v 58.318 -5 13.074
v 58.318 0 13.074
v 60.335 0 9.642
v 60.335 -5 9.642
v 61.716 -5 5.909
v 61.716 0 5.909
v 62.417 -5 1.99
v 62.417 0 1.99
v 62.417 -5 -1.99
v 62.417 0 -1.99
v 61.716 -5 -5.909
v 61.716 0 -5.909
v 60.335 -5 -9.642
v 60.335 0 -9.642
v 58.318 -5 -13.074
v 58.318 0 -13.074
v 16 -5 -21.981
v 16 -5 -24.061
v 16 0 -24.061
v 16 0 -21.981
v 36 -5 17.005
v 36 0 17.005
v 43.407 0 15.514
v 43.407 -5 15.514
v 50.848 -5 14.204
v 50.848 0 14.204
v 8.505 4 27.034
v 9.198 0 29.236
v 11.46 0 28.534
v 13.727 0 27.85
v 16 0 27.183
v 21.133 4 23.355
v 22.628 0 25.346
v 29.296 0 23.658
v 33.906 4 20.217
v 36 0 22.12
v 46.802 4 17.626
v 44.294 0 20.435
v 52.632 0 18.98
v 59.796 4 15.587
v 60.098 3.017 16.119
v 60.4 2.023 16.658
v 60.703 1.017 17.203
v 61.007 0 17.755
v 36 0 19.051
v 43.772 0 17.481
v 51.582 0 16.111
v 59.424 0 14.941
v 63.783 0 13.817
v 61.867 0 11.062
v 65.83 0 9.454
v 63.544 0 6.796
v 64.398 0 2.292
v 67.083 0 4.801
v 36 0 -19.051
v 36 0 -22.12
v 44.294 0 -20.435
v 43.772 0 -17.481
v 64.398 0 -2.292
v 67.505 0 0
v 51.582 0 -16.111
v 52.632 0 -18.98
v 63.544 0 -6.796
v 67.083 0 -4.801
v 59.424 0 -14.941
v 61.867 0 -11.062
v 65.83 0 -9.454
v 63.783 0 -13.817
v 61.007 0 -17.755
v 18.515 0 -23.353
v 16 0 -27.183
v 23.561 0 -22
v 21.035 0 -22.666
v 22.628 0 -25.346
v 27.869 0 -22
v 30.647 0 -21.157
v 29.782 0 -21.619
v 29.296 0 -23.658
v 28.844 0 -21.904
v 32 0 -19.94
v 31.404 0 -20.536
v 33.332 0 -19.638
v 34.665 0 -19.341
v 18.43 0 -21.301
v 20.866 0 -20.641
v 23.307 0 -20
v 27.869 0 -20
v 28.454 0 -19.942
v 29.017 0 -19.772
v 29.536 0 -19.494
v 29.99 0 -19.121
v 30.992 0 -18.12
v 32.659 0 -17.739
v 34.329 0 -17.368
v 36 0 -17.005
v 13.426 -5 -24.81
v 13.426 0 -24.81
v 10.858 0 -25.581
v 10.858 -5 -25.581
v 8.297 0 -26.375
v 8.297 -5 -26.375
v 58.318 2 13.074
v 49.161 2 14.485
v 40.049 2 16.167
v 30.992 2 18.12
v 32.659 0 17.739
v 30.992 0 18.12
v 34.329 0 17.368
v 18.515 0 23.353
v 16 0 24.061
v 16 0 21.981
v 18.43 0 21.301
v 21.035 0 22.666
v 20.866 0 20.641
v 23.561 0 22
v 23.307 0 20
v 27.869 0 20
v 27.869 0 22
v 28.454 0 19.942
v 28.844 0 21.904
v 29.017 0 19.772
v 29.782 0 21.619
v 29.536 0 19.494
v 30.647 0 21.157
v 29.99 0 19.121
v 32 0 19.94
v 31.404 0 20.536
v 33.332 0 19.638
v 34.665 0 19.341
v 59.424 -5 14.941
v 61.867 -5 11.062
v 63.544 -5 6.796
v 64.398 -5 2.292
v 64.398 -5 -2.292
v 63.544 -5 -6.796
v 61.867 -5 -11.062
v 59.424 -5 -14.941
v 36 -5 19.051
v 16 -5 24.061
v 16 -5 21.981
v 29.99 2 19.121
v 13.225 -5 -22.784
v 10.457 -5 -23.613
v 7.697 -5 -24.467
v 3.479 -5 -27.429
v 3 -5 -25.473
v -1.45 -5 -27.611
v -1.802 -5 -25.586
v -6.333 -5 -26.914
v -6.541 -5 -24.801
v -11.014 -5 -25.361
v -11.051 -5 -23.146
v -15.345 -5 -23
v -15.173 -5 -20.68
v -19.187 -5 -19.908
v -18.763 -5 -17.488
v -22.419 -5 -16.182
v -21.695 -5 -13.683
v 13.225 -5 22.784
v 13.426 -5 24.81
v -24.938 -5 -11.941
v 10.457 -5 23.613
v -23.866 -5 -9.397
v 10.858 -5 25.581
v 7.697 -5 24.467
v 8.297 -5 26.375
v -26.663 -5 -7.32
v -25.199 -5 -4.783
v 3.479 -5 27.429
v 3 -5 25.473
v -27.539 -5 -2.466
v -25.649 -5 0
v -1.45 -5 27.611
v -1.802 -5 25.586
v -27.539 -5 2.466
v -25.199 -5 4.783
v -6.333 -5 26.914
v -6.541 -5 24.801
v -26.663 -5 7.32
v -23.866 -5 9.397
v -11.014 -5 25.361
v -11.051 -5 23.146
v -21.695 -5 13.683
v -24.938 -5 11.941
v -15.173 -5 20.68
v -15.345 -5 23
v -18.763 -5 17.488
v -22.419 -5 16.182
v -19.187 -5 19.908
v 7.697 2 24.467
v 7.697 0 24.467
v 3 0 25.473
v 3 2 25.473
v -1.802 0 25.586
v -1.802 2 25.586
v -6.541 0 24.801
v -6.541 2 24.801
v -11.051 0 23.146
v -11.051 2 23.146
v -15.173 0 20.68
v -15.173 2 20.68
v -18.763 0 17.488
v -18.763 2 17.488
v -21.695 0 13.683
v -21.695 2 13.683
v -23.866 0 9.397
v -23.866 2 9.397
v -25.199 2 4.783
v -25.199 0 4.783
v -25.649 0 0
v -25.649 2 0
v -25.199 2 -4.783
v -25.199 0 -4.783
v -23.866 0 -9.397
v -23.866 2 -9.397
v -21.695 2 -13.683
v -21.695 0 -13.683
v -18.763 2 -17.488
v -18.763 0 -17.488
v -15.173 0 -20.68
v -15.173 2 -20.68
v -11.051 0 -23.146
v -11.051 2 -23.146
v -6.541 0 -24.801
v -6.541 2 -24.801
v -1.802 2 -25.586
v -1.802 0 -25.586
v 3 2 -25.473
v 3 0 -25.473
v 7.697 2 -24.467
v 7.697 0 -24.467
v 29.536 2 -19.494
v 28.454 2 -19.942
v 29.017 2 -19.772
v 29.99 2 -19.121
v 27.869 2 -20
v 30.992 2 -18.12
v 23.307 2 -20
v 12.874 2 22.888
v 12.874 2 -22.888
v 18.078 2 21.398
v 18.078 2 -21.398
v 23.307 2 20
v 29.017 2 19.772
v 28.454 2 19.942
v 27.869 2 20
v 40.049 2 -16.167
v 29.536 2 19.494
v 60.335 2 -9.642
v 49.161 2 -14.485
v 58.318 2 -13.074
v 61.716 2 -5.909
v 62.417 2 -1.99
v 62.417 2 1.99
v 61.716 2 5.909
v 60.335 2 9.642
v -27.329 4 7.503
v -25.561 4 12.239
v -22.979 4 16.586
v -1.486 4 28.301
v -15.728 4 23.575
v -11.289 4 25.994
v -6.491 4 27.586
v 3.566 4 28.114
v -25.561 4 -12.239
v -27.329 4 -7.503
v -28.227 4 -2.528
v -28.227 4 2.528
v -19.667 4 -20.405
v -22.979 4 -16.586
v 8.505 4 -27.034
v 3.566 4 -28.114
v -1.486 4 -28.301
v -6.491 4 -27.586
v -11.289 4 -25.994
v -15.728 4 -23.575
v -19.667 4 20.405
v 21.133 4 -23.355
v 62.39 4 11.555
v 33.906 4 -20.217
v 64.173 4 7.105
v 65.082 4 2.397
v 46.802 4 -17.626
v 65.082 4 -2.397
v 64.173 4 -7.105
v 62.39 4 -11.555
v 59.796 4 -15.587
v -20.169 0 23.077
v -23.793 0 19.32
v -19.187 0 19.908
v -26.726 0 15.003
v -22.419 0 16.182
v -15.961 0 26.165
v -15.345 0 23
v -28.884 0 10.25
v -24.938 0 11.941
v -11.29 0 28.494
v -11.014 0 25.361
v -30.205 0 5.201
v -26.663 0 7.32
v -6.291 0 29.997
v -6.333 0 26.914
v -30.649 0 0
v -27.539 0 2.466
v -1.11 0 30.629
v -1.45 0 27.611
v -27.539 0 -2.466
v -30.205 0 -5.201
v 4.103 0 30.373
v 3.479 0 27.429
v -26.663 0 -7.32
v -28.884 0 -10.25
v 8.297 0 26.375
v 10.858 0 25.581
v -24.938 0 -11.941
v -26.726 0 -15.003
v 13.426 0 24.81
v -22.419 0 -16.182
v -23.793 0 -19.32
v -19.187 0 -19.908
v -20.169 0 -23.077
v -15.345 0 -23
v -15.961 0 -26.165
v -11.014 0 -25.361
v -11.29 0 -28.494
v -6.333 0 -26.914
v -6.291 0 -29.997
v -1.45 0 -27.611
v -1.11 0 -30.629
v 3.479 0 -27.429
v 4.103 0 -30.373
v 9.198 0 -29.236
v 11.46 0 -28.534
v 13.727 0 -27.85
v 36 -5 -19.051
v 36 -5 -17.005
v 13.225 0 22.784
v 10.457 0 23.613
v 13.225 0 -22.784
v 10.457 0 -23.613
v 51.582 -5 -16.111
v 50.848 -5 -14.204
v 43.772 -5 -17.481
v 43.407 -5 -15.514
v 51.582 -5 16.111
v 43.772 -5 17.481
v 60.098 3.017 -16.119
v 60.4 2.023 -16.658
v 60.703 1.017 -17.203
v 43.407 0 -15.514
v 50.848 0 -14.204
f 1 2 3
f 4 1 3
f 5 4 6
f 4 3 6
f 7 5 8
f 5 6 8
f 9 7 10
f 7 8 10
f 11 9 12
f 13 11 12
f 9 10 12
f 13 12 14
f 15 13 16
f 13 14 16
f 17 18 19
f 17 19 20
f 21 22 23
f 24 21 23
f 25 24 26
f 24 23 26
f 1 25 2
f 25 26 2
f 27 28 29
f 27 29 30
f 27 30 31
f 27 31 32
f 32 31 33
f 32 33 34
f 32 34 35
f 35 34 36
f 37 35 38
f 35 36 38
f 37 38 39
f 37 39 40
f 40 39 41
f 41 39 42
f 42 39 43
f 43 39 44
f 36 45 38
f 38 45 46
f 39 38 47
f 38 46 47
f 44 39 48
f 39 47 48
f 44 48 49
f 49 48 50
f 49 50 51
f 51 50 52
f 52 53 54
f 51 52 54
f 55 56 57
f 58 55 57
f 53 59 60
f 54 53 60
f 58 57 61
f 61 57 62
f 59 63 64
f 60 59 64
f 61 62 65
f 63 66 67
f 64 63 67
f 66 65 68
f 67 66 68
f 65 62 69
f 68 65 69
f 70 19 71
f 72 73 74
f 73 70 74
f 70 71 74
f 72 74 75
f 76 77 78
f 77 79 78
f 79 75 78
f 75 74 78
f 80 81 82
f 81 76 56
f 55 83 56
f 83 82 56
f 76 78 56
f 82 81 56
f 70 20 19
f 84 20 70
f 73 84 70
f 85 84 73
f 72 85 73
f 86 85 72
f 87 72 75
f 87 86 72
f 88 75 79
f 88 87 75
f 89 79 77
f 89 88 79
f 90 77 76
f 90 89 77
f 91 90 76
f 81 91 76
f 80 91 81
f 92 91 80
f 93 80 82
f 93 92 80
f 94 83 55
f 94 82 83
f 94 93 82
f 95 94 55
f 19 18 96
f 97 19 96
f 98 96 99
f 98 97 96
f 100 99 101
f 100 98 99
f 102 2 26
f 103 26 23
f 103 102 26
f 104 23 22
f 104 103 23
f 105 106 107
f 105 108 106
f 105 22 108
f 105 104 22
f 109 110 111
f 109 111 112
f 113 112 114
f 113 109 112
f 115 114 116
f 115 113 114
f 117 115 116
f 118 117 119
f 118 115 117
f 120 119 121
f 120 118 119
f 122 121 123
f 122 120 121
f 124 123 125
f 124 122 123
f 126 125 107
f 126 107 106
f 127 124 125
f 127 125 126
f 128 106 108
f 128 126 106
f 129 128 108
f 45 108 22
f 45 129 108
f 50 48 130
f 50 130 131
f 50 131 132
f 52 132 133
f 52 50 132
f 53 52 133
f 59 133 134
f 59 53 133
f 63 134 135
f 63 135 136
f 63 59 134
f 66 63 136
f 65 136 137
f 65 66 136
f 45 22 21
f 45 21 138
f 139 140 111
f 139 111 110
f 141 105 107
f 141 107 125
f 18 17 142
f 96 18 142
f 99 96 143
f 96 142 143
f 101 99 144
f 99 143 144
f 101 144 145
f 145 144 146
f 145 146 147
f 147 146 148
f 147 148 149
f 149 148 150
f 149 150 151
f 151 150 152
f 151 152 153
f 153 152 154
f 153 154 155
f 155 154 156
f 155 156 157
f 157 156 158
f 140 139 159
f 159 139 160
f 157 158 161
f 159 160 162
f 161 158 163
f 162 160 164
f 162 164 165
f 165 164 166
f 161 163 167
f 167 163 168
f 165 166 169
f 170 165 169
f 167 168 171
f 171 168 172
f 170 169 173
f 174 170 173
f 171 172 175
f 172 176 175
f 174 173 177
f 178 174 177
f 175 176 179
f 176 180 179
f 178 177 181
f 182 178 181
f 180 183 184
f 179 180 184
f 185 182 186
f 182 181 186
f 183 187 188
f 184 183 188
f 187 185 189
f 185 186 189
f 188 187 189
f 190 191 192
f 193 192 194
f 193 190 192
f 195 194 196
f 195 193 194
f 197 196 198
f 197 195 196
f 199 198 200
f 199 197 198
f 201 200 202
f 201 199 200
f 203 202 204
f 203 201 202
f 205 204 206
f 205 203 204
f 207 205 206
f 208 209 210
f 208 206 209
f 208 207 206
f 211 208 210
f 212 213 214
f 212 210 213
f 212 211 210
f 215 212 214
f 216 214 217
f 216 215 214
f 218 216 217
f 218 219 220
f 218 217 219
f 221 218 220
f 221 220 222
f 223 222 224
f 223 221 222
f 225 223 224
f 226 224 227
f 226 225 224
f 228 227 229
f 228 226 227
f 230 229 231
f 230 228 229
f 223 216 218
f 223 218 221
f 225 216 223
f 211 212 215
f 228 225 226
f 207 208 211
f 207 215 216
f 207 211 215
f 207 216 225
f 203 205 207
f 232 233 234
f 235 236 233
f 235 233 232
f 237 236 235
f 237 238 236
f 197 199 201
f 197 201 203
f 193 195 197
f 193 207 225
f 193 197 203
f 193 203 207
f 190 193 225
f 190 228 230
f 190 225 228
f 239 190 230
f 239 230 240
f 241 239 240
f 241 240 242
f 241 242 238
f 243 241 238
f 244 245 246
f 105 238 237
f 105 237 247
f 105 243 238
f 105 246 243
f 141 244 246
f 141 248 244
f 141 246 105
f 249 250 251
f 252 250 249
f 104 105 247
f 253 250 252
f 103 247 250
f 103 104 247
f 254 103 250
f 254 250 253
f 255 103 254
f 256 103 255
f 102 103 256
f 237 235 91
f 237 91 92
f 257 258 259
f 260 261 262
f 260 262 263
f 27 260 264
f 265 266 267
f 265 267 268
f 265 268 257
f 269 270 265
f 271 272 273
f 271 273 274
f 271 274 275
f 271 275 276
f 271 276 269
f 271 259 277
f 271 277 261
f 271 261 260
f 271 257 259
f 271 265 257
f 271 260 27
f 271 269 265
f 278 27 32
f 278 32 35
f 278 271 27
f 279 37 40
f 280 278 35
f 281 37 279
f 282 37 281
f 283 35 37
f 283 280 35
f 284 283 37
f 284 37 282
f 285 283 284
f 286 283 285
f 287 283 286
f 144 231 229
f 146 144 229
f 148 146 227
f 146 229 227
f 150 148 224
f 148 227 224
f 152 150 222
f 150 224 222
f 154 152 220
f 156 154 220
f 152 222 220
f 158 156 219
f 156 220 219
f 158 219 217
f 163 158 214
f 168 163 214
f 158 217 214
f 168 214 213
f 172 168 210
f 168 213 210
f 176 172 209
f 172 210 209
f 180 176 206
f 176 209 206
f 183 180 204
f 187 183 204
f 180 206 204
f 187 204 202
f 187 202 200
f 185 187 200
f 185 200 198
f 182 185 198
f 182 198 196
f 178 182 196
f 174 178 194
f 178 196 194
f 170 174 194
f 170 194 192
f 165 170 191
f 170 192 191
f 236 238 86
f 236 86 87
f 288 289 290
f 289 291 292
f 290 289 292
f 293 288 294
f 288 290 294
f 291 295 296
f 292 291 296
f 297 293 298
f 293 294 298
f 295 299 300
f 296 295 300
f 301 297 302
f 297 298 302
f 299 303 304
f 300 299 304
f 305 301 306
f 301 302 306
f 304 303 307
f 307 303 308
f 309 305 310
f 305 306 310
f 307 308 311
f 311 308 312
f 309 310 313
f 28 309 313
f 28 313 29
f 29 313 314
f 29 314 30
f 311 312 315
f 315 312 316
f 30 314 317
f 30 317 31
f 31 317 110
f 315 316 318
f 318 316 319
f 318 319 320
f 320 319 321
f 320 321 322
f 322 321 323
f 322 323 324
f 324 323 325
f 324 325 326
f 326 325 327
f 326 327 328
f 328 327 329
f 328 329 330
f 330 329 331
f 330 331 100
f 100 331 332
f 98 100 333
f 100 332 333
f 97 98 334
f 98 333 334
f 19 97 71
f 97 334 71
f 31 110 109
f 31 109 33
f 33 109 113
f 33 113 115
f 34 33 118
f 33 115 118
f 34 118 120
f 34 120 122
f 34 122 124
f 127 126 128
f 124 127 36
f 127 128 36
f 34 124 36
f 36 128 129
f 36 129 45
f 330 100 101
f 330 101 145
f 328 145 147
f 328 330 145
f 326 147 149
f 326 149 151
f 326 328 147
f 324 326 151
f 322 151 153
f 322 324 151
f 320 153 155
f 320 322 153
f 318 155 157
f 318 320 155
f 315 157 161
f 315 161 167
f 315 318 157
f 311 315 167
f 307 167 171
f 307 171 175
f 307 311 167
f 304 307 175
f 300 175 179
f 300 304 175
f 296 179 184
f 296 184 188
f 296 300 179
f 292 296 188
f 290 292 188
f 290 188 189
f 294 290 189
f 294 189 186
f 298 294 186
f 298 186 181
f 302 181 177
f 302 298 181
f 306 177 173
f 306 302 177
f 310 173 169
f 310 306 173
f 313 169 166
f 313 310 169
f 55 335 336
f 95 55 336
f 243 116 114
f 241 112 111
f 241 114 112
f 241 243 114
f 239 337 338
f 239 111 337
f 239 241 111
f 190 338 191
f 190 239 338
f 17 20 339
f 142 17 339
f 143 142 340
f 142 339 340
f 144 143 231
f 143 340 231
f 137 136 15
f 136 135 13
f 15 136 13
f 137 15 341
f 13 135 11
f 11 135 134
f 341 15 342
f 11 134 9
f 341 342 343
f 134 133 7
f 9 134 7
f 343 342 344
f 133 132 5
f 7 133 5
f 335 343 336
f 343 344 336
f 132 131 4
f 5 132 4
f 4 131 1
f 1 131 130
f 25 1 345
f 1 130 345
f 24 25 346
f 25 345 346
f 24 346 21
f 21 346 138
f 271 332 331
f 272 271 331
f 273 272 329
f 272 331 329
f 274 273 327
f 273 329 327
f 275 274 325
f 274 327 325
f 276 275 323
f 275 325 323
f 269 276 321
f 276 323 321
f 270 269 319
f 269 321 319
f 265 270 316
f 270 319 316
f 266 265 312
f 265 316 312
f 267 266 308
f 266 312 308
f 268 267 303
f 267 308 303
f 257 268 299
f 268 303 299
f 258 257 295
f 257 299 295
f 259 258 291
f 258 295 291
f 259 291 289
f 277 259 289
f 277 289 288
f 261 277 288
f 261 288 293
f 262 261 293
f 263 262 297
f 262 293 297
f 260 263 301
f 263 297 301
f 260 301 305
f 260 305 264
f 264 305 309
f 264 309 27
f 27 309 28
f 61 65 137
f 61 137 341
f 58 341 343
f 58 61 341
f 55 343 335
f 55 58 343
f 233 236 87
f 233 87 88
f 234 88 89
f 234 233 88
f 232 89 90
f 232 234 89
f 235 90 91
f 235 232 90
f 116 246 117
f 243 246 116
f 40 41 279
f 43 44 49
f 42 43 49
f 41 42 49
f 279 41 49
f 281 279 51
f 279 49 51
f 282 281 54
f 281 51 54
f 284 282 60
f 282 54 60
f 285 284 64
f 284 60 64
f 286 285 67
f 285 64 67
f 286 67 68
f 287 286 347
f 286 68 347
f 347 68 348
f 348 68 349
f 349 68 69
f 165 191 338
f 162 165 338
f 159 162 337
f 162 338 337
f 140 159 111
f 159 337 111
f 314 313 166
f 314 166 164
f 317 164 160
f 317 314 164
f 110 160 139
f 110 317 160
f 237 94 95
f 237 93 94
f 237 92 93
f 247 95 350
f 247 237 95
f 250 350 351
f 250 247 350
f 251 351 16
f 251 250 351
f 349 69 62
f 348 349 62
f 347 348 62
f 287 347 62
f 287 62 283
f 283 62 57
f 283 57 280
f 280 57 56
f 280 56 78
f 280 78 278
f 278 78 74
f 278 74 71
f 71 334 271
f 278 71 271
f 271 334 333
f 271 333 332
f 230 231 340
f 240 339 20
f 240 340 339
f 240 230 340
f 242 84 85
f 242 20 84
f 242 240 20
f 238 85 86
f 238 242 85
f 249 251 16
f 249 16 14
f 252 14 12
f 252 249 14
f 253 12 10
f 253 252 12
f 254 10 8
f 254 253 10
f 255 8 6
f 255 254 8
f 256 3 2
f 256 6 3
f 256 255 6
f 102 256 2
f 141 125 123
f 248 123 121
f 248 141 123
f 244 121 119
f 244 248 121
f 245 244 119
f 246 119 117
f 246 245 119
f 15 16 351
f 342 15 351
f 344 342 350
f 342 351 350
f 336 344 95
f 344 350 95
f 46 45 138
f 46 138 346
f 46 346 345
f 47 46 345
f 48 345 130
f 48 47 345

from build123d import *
from build123d.topology import SkipClean

# Parameters (mm, degrees)
BOSS_EXTRUDE1_DEPTH = 4
BOSS_EXTRUDE1_DRAFT = 30
BOSS_EXTRUDE2_DEPTH = 5
CUT_EXTRUDE1_START  = -2
CUT_EXTRUDE1_DEPTH  = 2
SKETCH4_W           = 20
SKETCH4_H           = 65
CUT_EXTRUDE2_DEPTH  = 5


with BuildPart() as part:
    # Sketch1 → Boss-Extrude1 (with draft: the straight prism first)
    with BuildSketch(Plane(origin=(0, 0, 0), x_dir=(1, 0, 0), z_dir=(0, 1, 0))):
        with BuildLine():
            ThreePointArc((9.197775679, 29.236469294), (-30.649147039, 0), (9.197775679, -29.236469294))
            ThreePointArc((9.197775679, -29.236469294), (34.853272727, -22.372060148), (61.006889531, -17.755462936))
            ThreePointArc((61.006889531, -17.755462936), (67.505378962, 0), (61.006889531, 17.755462936))
            ThreePointArc((61.006889531, 17.755462936), (34.853272727, 22.372060148), (9.197775679, 29.236469294))
        make_face()
    extrude(amount=BOSS_EXTRUDE1_DEPTH)
    # Boss-Extrude1: the draft: its side faces are tilted about the plane it starts from
    boss_extrude1_sides = [part.faces().sort_by_distance(p)[0] for p in [
        (34.853272727, 2, -22.372060148),
        (-30.649147039, 2, 0),
        (34.853272727, 2, 22.372060148),
        (67.505378962, 2, 0),
    ]]
    draft(boss_extrude1_sides, Plane(origin=(0, 0, 0), x_dir=(1, 0, 0), z_dir=(0, 1, 0)), BOSS_EXTRUDE1_DRAFT)

    # Sketch2 → Boss-Extrude2 (add)
    with BuildSketch(Plane.XZ):
        with BuildLine():
            Line((27.868957123, -22), (23.561105774, -22))
            ThreePointArc((23.561105774, -22), (15.901219685, -24.089426048), (8.297478943, -26.374745026))
            ThreePointArc((8.297478943, -26.374745026), (-27.649147039, 0), (8.297478943, 26.374745026))
            ThreePointArc((8.297478943, 26.374745026), (15.901219685, 24.089426048), (23.561105774, 22))
            Line((23.561105774, 22), (27.868957123, 22))
            ThreePointArc((27.868957123, 22), (29.782374284, 21.619397663), (31.404491029, 20.535533906))
            Line((31.404491029, 20.535533906), (32, 19.940024934))
            ThreePointArc((32, 19.940024934), (45.655548758, 17.131412627), (59.423772768, 14.940905244))
            ThreePointArc((59.423772768, 14.940905244), (64.505378962, 0), (59.423772768, -14.940905244))
            ThreePointArc((59.423772768, -14.940905244), (45.655548758, -17.131412627), (32, -19.940024934))
            Line((32, -19.940024934), (31.404491029, -20.535533906))
            ThreePointArc((31.404491029, -20.535533906), (29.782374284, -21.619397663), (27.868957123, -22))
        make_face()
        with BuildLine():
            Line((27.868957123, -20), (23.306693962, -20))
            ThreePointArc((23.306693962, -20), (15.472865522, -22.131699291), (7.697281119, -24.466928847))
            ThreePointArc((7.697281119, -24.466928847), (-25.649147039, 0), (7.697281119, 24.466928847))
            ThreePointArc((7.697281119, 24.466928847), (15.472865522, 22.131699291), (23.306693962, 20))
            Line((23.306693962, 20), (27.868957123, 20))
            ThreePointArc((27.868957123, 20), (29.01700742, 19.771638598), (29.990277466, 19.121320344))
            Line((29.990277466, 19.121320344), (30.991752856, 18.119844953))
            ThreePointArc((30.991752856, 18.119844953), (44.598722443, 15.291926863), (58.318334372, 13.074047119))
            ThreePointArc((58.318334372, 13.074047119), (62.505378962, 0), (58.318334372, -13.074047119))
            ThreePointArc((58.318334372, -13.074047119), (44.598722443, -15.291926863), (30.991752856, -18.119844953))
            Line((30.991752856, -18.119844953), (29.990277466, -19.121320344))
            ThreePointArc((29.990277466, -19.121320344), (29.01700742, -19.771638598), (27.868957123, -20))
        make_face(mode=Mode.SUBTRACT)
    extrude(amount=BOSS_EXTRUDE2_DEPTH)

    # Sketch3 → Cut-Extrude1 (cut)
    with SkipClean():  # the faces are left unmerged after this step: merging them gives an invalid solid
        with BuildSketch(Plane.XZ.offset(CUT_EXTRUDE1_START)):
            with BuildLine():
                Line((23.306693962, -20), (27.868957123, -20))
                ThreePointArc((27.868957123, -20), (29.01700742, -19.771638598), (29.990277466, -19.121320344))
                Line((29.990277466, -19.121320344), (30.991752856, -18.119844953))
                ThreePointArc((30.991752856, -18.119844953), (44.598722443, -15.291926863), (58.318334372, -13.074047119))
                ThreePointArc((58.318334372, -13.074047119), (62.505378962, 0), (58.318334372, 13.074047119))
                ThreePointArc((58.318334372, 13.074047119), (44.598722443, 15.291926863), (30.991752856, 18.119844953))
                Line((30.991752856, 18.119844953), (29.990277466, 19.121320344))
                ThreePointArc((29.990277466, 19.121320344), (29.01700742, 19.771638598), (27.868957123, 20))
                Line((27.868957123, 20), (23.306693962, 20))
                ThreePointArc((23.306693962, 20), (15.472865522, 22.131699291), (7.697281119, 24.466928847))
                ThreePointArc((7.697281119, 24.466928847), (-25.649147039, 0), (7.697281119, -24.466928847))
                ThreePointArc((7.697281119, -24.466928847), (15.472865522, -22.131699291), (23.306693962, -20))
            make_face()
        extrude(amount=CUT_EXTRUDE1_DEPTH, mode=Mode.SUBTRACT)

    # Sketch4 → Cut-Extrude2 (cut)
    with SkipClean():  # the faces are left unmerged after this step: merging them gives an invalid solid
        with BuildSketch(Plane.XZ.offset(5)):
            with Locations((26, 0)):
                Rectangle(SKETCH4_W, SKETCH4_H)
        extrude(amount=-CUT_EXTRUDE2_DEPTH, mode=Mode.SUBTRACT)


solid = part.part
